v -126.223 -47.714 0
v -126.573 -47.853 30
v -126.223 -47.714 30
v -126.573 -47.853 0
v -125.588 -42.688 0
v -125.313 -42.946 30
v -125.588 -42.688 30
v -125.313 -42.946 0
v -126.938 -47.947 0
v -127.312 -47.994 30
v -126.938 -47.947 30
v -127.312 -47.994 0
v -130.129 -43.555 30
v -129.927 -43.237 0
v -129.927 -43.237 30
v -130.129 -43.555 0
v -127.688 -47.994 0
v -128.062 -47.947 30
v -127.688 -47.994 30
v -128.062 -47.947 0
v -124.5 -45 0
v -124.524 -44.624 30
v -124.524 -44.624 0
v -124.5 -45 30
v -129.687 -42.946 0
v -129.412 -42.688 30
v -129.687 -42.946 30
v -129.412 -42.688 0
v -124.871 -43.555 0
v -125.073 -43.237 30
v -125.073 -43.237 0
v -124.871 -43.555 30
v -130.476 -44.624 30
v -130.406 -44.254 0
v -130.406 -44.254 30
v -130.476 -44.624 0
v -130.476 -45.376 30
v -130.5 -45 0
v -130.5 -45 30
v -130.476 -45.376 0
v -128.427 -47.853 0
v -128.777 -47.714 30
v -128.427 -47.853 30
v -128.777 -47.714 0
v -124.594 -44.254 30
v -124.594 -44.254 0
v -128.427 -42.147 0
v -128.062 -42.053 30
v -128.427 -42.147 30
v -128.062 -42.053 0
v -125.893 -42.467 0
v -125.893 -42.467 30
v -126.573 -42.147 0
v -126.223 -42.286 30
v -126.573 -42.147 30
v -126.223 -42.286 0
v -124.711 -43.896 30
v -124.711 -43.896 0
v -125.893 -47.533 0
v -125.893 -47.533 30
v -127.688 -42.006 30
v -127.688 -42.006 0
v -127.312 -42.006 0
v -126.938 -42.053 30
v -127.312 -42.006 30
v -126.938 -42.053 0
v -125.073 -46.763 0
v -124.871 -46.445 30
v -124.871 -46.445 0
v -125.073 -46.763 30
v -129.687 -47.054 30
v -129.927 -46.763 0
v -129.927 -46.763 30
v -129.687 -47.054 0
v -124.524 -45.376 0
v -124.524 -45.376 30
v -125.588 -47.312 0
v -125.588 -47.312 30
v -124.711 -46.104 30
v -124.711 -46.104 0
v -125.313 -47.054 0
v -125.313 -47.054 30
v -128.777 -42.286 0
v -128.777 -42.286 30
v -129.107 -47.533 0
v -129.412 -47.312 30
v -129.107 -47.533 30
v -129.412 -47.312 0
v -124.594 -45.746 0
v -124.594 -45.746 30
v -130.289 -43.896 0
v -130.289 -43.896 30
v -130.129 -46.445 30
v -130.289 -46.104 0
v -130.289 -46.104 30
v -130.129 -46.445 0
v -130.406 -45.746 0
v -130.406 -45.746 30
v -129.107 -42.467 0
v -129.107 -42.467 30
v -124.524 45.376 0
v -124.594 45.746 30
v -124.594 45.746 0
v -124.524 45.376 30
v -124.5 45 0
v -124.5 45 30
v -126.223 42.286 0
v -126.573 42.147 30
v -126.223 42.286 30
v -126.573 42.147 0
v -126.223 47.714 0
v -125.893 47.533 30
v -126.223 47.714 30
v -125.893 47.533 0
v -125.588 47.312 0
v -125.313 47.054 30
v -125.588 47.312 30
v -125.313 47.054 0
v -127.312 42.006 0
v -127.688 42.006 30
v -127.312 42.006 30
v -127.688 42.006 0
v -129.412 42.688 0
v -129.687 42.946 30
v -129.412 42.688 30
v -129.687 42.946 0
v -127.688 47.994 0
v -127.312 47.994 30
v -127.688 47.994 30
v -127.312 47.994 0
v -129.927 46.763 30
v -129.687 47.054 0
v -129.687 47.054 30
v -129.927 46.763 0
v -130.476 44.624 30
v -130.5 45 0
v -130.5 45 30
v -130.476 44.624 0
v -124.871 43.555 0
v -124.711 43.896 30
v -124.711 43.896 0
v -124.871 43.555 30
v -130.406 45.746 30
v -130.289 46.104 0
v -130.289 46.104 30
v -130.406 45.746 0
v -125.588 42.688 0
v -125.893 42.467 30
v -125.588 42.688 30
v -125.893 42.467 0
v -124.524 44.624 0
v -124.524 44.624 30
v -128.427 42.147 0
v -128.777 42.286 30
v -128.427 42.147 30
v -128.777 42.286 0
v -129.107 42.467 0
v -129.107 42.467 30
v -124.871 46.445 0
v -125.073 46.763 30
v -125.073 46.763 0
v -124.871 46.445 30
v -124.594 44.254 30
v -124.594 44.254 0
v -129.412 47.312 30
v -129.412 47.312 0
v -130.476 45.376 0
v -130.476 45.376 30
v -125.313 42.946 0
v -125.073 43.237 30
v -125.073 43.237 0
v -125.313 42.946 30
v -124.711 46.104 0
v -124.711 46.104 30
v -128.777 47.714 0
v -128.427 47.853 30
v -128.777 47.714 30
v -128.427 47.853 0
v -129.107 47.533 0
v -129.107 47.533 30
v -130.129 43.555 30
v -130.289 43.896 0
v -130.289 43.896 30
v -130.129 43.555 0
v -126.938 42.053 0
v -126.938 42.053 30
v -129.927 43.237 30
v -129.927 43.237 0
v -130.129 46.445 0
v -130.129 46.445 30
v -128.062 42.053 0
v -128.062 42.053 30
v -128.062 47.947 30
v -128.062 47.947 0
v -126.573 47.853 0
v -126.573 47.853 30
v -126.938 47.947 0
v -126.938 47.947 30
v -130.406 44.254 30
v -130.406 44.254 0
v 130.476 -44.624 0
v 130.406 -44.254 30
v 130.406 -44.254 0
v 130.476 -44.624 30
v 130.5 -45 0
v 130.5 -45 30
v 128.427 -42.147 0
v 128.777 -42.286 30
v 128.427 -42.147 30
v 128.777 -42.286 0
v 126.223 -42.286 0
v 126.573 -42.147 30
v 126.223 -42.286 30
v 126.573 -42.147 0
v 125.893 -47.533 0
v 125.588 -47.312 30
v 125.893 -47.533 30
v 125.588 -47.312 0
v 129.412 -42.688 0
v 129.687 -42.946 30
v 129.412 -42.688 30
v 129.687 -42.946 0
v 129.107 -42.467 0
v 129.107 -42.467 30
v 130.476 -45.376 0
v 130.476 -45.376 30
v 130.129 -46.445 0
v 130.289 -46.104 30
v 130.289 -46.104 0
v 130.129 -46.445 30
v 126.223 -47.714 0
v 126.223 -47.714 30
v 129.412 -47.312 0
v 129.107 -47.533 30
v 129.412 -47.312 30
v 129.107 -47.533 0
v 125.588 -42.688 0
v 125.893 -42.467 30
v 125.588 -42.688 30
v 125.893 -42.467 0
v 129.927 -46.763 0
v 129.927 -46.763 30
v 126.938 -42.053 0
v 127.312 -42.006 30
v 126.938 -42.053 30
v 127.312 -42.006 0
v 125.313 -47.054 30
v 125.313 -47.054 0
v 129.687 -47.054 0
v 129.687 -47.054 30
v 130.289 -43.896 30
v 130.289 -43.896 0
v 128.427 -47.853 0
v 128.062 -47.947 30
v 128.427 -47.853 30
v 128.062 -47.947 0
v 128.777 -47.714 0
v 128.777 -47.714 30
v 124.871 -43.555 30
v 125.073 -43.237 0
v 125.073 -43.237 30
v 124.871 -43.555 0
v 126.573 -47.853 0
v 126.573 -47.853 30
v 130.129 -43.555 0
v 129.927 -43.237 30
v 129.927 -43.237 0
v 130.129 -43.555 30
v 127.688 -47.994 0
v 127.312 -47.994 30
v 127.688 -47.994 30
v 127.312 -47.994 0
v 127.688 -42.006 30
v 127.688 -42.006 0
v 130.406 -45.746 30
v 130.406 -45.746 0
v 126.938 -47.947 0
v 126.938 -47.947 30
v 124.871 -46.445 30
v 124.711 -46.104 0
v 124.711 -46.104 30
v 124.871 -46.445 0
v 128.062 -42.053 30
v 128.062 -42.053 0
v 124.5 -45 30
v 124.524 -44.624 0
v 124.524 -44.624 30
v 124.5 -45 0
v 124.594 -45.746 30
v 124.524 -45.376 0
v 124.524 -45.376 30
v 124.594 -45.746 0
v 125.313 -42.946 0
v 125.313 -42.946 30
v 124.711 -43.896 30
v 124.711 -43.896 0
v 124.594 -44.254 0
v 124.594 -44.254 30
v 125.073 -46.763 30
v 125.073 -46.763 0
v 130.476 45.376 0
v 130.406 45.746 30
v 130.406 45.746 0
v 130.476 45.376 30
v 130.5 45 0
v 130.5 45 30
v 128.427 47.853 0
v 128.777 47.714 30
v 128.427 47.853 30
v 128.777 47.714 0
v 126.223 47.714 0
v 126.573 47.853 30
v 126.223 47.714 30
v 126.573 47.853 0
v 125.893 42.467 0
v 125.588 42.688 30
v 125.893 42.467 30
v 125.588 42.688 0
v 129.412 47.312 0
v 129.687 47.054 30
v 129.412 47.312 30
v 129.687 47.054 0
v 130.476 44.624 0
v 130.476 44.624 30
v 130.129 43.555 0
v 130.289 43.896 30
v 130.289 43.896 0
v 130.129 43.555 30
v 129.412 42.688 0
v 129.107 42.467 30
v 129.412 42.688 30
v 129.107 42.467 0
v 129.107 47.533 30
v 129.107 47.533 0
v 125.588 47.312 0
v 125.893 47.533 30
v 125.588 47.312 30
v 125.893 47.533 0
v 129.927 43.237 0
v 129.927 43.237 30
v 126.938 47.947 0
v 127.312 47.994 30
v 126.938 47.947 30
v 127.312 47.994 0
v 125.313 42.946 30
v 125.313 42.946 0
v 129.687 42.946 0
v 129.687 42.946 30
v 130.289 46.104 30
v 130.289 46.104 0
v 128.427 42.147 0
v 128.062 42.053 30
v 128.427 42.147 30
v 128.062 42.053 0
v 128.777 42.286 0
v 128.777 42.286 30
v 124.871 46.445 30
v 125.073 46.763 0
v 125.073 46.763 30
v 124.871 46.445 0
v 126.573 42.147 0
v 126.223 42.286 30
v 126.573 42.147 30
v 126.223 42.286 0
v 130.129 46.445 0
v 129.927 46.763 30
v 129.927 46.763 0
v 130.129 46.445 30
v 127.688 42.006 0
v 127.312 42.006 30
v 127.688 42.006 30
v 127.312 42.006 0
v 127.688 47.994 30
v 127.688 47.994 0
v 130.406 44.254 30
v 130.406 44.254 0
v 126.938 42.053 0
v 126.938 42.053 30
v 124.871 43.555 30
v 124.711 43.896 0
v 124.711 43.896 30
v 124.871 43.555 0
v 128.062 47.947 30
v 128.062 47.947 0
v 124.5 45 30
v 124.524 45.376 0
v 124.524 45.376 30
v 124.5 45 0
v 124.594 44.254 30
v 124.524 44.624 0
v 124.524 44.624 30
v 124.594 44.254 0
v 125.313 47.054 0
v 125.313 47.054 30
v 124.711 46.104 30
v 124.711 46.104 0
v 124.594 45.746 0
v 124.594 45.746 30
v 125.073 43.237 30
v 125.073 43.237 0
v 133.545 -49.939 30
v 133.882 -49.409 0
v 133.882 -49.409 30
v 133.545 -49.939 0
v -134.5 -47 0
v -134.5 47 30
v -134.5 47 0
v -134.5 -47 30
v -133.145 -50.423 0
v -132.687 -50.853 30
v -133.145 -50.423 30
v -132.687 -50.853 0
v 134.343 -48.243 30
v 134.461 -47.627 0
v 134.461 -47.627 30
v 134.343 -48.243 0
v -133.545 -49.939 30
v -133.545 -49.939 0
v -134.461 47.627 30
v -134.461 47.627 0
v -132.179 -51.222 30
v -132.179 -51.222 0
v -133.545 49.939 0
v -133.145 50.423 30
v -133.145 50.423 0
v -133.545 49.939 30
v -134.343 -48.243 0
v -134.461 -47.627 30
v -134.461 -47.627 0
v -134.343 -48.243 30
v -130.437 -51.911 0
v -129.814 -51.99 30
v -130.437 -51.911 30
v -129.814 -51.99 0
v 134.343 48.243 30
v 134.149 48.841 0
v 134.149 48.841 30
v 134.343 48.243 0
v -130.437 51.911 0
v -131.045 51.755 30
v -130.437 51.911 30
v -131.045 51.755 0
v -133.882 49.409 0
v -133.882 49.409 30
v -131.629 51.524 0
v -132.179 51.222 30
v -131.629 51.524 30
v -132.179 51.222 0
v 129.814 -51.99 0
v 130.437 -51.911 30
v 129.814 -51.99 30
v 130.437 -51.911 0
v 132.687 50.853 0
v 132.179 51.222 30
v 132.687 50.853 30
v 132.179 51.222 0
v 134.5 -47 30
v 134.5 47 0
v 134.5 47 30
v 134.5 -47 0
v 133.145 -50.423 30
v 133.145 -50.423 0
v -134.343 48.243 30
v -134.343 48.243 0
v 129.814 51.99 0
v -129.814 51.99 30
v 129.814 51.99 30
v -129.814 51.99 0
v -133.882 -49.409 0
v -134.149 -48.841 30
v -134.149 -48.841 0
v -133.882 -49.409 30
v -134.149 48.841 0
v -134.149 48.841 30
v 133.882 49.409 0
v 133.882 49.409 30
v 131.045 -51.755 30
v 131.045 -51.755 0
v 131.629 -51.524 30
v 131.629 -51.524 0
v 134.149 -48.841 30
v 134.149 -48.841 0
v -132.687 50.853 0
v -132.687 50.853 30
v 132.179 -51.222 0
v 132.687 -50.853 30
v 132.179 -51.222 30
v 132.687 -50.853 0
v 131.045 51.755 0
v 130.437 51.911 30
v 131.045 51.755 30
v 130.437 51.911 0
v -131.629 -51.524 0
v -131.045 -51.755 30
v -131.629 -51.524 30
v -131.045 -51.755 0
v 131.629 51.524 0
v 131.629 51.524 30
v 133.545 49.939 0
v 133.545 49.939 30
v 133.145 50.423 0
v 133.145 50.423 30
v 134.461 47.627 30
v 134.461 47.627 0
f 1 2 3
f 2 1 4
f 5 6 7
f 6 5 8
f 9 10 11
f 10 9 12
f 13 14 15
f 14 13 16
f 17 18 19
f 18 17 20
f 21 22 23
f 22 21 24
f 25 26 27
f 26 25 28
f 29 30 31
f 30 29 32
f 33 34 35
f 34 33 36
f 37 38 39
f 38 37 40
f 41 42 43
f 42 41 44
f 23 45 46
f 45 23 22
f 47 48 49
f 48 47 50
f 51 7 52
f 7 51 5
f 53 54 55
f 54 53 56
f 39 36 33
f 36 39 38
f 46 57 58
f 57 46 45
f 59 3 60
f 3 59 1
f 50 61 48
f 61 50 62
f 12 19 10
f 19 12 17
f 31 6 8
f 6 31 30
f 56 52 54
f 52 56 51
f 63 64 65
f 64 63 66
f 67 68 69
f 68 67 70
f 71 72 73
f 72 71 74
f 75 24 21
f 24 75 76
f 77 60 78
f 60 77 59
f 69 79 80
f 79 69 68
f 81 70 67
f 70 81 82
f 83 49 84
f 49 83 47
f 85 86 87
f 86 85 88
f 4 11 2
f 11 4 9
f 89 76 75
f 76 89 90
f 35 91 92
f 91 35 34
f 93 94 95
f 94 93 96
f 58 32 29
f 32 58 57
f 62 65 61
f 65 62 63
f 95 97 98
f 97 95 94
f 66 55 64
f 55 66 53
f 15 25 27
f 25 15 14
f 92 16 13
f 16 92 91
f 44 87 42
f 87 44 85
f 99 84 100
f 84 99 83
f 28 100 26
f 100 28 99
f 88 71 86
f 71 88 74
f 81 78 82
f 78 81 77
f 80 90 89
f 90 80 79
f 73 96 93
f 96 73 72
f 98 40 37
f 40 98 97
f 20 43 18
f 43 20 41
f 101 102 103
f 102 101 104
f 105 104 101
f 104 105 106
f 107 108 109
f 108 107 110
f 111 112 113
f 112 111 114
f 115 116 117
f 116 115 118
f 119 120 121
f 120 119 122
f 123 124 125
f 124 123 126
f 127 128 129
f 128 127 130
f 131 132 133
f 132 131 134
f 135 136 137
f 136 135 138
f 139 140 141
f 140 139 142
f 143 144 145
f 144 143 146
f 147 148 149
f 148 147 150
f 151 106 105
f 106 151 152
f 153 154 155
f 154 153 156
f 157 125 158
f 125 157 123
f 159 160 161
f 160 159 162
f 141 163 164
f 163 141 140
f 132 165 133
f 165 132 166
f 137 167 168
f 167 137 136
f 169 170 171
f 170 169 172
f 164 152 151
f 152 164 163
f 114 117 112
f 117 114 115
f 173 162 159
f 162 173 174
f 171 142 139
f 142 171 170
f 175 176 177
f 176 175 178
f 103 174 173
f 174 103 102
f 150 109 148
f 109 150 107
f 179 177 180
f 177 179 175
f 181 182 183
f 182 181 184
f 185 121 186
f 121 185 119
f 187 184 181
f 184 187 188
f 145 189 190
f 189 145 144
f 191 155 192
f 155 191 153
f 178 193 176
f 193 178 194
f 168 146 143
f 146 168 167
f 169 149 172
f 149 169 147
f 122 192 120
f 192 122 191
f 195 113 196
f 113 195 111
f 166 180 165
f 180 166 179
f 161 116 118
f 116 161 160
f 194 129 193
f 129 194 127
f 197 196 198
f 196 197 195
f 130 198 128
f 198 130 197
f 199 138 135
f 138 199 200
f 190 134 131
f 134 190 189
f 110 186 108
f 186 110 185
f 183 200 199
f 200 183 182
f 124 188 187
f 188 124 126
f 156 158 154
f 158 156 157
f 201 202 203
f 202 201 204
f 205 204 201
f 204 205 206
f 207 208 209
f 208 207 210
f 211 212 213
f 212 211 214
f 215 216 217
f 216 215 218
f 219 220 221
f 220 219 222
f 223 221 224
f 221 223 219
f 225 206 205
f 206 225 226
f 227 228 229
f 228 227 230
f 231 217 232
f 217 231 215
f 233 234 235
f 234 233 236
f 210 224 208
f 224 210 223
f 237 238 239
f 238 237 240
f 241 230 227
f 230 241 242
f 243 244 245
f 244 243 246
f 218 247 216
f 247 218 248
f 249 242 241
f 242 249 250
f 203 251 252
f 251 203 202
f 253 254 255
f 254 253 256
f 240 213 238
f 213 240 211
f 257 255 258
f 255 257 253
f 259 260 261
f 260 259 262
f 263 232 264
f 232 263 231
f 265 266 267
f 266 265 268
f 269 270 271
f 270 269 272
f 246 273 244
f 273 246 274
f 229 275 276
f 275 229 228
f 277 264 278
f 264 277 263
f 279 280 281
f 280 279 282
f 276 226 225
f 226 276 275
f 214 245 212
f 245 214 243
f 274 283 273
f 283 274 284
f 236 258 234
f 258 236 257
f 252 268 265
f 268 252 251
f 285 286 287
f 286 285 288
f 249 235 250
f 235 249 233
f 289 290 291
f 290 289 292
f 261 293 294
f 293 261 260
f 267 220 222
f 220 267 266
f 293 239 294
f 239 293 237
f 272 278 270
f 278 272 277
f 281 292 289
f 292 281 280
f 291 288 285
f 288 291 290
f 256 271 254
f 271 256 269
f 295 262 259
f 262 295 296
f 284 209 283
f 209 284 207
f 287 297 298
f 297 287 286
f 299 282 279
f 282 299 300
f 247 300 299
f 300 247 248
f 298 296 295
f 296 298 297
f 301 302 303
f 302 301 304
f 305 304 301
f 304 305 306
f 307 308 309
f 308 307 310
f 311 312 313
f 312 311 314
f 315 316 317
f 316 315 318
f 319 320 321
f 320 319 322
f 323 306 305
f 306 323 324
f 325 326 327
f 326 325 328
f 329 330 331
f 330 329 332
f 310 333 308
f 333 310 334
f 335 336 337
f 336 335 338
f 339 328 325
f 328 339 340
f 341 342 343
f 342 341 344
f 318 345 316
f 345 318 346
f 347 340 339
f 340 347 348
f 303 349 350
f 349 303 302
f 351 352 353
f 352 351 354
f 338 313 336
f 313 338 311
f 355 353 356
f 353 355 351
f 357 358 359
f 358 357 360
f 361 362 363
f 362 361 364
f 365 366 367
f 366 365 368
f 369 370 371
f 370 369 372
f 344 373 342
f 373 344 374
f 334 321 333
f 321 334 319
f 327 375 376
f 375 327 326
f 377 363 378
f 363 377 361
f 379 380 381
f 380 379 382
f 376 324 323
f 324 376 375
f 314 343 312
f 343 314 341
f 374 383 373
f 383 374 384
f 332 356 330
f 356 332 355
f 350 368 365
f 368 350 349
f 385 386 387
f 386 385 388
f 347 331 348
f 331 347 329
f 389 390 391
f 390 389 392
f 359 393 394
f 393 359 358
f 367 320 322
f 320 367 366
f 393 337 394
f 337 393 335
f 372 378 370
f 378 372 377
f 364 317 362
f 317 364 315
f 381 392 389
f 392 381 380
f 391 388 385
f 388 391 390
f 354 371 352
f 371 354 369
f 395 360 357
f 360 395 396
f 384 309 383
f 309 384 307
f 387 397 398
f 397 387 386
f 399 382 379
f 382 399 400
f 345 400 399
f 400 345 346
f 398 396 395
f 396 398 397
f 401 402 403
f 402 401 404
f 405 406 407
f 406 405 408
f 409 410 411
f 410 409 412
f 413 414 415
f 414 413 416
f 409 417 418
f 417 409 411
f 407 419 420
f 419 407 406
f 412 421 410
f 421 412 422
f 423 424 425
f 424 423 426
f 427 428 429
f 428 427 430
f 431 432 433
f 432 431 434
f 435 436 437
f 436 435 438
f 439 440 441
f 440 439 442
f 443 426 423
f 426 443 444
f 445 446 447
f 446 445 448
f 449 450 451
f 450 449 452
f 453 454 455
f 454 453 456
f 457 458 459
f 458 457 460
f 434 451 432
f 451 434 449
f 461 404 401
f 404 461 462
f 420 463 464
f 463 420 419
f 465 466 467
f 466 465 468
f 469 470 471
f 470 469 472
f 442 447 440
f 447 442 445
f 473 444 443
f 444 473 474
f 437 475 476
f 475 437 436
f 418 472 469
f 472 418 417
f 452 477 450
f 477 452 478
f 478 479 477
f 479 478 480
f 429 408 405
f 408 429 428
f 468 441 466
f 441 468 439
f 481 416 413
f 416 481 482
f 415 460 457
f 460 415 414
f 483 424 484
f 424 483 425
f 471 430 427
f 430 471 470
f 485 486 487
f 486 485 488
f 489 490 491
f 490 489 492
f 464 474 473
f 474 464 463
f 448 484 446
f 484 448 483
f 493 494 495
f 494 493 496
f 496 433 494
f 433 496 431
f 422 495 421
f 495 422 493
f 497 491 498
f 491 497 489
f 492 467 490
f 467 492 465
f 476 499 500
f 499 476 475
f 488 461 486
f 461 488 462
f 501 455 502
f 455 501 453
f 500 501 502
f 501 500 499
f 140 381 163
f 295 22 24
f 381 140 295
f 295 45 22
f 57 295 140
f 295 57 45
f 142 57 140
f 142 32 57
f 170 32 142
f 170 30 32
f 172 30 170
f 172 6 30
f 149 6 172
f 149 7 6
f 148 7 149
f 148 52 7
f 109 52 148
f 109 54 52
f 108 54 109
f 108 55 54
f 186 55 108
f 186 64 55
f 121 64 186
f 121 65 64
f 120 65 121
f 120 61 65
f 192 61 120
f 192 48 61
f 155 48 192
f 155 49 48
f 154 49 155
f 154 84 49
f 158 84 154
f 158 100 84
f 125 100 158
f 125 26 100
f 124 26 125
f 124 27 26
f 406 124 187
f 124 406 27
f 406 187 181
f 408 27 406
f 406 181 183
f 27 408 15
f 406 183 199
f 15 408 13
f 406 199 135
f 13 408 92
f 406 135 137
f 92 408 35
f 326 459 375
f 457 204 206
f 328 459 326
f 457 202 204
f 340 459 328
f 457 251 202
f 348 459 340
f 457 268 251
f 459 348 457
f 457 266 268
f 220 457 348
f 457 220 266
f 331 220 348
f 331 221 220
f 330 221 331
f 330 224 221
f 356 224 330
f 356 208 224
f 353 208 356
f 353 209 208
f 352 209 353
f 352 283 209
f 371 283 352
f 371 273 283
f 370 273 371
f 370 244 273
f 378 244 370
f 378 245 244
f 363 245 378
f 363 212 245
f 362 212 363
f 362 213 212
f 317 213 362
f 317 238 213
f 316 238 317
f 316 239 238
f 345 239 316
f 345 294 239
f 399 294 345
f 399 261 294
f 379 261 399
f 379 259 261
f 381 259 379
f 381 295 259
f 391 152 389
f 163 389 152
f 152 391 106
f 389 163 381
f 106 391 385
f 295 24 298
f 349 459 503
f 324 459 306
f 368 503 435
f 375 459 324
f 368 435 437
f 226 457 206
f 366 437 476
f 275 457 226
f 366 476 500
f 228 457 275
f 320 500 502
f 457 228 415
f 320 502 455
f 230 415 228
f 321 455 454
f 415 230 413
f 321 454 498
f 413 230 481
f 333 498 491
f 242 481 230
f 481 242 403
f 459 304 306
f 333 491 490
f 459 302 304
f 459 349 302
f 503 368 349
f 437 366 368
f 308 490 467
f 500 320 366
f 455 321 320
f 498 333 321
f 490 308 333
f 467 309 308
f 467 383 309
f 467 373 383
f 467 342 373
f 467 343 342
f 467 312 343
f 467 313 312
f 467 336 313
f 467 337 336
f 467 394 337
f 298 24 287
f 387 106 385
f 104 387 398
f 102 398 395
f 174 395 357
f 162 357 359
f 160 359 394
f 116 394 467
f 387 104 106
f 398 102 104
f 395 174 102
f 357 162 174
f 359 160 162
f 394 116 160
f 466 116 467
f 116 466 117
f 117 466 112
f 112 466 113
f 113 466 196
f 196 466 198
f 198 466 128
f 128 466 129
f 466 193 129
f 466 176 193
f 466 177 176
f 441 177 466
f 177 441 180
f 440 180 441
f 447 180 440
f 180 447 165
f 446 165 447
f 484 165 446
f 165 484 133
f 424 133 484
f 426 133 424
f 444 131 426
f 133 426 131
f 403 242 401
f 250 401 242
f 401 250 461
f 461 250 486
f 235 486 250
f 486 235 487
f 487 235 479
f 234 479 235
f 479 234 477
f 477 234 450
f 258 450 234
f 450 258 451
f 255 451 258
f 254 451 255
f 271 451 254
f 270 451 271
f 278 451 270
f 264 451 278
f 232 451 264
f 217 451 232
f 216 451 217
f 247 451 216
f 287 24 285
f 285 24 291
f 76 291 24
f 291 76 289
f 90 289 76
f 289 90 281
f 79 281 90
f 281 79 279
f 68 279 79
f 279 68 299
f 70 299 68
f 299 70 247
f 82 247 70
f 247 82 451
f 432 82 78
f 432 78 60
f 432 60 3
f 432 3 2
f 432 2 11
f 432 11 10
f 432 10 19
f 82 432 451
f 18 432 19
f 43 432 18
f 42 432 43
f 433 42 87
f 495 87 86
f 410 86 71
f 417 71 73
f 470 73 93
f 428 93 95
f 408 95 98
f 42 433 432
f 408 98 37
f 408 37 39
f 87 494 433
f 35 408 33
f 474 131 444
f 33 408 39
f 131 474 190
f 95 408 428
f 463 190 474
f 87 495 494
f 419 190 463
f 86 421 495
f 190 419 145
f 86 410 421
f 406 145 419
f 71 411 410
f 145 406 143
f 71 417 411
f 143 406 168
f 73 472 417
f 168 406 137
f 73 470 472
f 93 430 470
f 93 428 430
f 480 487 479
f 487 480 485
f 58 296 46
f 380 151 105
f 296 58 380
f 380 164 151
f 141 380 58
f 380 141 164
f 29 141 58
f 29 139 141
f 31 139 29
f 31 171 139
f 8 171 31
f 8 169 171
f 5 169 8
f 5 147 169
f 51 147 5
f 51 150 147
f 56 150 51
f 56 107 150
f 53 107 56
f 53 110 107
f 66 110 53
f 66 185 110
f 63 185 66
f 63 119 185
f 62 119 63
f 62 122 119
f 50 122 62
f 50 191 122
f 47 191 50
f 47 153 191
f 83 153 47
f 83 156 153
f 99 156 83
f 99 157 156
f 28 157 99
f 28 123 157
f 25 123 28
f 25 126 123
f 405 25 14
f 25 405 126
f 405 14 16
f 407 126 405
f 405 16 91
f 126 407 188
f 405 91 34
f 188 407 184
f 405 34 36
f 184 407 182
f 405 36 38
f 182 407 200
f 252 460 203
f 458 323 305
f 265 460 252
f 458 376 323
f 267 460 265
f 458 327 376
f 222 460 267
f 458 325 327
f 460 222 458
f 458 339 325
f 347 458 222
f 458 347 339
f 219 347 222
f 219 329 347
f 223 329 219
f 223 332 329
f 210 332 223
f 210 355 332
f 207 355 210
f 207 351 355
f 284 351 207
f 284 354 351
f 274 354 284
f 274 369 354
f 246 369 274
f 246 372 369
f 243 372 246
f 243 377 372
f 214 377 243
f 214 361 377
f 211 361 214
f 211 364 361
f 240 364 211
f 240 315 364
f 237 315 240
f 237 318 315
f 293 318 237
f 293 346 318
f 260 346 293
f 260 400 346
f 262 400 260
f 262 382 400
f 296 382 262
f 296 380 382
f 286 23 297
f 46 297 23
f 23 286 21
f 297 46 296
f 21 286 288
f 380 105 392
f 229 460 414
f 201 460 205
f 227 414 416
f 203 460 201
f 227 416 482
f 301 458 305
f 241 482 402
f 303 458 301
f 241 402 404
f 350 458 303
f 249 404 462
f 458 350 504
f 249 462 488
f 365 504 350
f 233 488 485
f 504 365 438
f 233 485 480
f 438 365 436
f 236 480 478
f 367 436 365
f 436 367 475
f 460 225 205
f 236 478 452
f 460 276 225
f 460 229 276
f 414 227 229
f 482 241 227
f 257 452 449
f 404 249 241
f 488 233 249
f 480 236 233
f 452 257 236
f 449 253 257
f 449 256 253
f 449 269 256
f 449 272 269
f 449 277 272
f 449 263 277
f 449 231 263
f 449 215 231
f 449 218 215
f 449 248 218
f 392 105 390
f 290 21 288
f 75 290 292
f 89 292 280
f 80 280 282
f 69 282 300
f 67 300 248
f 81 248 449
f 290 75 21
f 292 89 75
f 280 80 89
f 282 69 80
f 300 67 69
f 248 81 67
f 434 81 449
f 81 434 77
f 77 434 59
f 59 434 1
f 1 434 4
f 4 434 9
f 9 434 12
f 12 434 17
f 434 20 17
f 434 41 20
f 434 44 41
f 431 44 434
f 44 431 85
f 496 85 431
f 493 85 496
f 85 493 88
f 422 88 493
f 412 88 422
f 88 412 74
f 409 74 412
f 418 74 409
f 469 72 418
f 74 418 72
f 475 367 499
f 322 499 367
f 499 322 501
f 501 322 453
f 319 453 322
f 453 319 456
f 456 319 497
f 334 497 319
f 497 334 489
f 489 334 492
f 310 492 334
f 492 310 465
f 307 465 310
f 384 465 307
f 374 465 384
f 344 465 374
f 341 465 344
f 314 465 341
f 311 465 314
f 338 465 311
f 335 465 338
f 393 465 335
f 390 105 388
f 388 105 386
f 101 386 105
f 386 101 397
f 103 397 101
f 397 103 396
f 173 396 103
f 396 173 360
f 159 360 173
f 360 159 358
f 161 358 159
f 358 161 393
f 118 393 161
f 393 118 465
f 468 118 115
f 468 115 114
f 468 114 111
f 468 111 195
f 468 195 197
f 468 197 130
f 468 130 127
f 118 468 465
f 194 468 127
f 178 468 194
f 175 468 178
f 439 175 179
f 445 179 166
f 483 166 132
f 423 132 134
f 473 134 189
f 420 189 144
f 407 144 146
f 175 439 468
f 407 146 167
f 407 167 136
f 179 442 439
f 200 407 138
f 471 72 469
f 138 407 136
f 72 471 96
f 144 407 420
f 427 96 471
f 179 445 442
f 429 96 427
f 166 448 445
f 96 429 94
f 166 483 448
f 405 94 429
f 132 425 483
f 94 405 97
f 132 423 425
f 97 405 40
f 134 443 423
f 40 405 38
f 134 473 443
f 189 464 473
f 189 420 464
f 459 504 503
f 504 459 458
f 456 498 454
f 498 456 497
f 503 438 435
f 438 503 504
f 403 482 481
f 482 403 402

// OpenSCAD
$fn = 50;


difference() {
	union() {
		hull() {
			translate(v = [-129.5000000000, 47.0000000000, 0]) {
				cylinder(h = 30, r = 5);
			}
			translate(v = [129.5000000000, 47.0000000000, 0]) {
				cylinder(h = 30, r = 5);
			}
			translate(v = [-129.5000000000, -47.0000000000, 0]) {
				cylinder(h = 30, r = 5);
			}
			translate(v = [129.5000000000, -47.0000000000, 0]) {
				cylinder(h = 30, r = 5);
			}
		}
	}
	union() {
		translate(v = [-127.5000000000, -45.0000000000, -100.0000000000]) {
			cylinder(h = 200, r = 3.0000000000);
		}
		translate(v = [-127.5000000000, 45.0000000000, -100.0000000000]) {
			cylinder(h = 200, r = 3.0000000000);
		}
		translate(v = [127.5000000000, -45.0000000000, -100.0000000000]) {
			cylinder(h = 200, r = 3.0000000000);
		}
		translate(v = [127.5000000000, 45.0000000000, -100.0000000000]) {
			cylinder(h = 200, r = 3.0000000000);
		}
	}
}
